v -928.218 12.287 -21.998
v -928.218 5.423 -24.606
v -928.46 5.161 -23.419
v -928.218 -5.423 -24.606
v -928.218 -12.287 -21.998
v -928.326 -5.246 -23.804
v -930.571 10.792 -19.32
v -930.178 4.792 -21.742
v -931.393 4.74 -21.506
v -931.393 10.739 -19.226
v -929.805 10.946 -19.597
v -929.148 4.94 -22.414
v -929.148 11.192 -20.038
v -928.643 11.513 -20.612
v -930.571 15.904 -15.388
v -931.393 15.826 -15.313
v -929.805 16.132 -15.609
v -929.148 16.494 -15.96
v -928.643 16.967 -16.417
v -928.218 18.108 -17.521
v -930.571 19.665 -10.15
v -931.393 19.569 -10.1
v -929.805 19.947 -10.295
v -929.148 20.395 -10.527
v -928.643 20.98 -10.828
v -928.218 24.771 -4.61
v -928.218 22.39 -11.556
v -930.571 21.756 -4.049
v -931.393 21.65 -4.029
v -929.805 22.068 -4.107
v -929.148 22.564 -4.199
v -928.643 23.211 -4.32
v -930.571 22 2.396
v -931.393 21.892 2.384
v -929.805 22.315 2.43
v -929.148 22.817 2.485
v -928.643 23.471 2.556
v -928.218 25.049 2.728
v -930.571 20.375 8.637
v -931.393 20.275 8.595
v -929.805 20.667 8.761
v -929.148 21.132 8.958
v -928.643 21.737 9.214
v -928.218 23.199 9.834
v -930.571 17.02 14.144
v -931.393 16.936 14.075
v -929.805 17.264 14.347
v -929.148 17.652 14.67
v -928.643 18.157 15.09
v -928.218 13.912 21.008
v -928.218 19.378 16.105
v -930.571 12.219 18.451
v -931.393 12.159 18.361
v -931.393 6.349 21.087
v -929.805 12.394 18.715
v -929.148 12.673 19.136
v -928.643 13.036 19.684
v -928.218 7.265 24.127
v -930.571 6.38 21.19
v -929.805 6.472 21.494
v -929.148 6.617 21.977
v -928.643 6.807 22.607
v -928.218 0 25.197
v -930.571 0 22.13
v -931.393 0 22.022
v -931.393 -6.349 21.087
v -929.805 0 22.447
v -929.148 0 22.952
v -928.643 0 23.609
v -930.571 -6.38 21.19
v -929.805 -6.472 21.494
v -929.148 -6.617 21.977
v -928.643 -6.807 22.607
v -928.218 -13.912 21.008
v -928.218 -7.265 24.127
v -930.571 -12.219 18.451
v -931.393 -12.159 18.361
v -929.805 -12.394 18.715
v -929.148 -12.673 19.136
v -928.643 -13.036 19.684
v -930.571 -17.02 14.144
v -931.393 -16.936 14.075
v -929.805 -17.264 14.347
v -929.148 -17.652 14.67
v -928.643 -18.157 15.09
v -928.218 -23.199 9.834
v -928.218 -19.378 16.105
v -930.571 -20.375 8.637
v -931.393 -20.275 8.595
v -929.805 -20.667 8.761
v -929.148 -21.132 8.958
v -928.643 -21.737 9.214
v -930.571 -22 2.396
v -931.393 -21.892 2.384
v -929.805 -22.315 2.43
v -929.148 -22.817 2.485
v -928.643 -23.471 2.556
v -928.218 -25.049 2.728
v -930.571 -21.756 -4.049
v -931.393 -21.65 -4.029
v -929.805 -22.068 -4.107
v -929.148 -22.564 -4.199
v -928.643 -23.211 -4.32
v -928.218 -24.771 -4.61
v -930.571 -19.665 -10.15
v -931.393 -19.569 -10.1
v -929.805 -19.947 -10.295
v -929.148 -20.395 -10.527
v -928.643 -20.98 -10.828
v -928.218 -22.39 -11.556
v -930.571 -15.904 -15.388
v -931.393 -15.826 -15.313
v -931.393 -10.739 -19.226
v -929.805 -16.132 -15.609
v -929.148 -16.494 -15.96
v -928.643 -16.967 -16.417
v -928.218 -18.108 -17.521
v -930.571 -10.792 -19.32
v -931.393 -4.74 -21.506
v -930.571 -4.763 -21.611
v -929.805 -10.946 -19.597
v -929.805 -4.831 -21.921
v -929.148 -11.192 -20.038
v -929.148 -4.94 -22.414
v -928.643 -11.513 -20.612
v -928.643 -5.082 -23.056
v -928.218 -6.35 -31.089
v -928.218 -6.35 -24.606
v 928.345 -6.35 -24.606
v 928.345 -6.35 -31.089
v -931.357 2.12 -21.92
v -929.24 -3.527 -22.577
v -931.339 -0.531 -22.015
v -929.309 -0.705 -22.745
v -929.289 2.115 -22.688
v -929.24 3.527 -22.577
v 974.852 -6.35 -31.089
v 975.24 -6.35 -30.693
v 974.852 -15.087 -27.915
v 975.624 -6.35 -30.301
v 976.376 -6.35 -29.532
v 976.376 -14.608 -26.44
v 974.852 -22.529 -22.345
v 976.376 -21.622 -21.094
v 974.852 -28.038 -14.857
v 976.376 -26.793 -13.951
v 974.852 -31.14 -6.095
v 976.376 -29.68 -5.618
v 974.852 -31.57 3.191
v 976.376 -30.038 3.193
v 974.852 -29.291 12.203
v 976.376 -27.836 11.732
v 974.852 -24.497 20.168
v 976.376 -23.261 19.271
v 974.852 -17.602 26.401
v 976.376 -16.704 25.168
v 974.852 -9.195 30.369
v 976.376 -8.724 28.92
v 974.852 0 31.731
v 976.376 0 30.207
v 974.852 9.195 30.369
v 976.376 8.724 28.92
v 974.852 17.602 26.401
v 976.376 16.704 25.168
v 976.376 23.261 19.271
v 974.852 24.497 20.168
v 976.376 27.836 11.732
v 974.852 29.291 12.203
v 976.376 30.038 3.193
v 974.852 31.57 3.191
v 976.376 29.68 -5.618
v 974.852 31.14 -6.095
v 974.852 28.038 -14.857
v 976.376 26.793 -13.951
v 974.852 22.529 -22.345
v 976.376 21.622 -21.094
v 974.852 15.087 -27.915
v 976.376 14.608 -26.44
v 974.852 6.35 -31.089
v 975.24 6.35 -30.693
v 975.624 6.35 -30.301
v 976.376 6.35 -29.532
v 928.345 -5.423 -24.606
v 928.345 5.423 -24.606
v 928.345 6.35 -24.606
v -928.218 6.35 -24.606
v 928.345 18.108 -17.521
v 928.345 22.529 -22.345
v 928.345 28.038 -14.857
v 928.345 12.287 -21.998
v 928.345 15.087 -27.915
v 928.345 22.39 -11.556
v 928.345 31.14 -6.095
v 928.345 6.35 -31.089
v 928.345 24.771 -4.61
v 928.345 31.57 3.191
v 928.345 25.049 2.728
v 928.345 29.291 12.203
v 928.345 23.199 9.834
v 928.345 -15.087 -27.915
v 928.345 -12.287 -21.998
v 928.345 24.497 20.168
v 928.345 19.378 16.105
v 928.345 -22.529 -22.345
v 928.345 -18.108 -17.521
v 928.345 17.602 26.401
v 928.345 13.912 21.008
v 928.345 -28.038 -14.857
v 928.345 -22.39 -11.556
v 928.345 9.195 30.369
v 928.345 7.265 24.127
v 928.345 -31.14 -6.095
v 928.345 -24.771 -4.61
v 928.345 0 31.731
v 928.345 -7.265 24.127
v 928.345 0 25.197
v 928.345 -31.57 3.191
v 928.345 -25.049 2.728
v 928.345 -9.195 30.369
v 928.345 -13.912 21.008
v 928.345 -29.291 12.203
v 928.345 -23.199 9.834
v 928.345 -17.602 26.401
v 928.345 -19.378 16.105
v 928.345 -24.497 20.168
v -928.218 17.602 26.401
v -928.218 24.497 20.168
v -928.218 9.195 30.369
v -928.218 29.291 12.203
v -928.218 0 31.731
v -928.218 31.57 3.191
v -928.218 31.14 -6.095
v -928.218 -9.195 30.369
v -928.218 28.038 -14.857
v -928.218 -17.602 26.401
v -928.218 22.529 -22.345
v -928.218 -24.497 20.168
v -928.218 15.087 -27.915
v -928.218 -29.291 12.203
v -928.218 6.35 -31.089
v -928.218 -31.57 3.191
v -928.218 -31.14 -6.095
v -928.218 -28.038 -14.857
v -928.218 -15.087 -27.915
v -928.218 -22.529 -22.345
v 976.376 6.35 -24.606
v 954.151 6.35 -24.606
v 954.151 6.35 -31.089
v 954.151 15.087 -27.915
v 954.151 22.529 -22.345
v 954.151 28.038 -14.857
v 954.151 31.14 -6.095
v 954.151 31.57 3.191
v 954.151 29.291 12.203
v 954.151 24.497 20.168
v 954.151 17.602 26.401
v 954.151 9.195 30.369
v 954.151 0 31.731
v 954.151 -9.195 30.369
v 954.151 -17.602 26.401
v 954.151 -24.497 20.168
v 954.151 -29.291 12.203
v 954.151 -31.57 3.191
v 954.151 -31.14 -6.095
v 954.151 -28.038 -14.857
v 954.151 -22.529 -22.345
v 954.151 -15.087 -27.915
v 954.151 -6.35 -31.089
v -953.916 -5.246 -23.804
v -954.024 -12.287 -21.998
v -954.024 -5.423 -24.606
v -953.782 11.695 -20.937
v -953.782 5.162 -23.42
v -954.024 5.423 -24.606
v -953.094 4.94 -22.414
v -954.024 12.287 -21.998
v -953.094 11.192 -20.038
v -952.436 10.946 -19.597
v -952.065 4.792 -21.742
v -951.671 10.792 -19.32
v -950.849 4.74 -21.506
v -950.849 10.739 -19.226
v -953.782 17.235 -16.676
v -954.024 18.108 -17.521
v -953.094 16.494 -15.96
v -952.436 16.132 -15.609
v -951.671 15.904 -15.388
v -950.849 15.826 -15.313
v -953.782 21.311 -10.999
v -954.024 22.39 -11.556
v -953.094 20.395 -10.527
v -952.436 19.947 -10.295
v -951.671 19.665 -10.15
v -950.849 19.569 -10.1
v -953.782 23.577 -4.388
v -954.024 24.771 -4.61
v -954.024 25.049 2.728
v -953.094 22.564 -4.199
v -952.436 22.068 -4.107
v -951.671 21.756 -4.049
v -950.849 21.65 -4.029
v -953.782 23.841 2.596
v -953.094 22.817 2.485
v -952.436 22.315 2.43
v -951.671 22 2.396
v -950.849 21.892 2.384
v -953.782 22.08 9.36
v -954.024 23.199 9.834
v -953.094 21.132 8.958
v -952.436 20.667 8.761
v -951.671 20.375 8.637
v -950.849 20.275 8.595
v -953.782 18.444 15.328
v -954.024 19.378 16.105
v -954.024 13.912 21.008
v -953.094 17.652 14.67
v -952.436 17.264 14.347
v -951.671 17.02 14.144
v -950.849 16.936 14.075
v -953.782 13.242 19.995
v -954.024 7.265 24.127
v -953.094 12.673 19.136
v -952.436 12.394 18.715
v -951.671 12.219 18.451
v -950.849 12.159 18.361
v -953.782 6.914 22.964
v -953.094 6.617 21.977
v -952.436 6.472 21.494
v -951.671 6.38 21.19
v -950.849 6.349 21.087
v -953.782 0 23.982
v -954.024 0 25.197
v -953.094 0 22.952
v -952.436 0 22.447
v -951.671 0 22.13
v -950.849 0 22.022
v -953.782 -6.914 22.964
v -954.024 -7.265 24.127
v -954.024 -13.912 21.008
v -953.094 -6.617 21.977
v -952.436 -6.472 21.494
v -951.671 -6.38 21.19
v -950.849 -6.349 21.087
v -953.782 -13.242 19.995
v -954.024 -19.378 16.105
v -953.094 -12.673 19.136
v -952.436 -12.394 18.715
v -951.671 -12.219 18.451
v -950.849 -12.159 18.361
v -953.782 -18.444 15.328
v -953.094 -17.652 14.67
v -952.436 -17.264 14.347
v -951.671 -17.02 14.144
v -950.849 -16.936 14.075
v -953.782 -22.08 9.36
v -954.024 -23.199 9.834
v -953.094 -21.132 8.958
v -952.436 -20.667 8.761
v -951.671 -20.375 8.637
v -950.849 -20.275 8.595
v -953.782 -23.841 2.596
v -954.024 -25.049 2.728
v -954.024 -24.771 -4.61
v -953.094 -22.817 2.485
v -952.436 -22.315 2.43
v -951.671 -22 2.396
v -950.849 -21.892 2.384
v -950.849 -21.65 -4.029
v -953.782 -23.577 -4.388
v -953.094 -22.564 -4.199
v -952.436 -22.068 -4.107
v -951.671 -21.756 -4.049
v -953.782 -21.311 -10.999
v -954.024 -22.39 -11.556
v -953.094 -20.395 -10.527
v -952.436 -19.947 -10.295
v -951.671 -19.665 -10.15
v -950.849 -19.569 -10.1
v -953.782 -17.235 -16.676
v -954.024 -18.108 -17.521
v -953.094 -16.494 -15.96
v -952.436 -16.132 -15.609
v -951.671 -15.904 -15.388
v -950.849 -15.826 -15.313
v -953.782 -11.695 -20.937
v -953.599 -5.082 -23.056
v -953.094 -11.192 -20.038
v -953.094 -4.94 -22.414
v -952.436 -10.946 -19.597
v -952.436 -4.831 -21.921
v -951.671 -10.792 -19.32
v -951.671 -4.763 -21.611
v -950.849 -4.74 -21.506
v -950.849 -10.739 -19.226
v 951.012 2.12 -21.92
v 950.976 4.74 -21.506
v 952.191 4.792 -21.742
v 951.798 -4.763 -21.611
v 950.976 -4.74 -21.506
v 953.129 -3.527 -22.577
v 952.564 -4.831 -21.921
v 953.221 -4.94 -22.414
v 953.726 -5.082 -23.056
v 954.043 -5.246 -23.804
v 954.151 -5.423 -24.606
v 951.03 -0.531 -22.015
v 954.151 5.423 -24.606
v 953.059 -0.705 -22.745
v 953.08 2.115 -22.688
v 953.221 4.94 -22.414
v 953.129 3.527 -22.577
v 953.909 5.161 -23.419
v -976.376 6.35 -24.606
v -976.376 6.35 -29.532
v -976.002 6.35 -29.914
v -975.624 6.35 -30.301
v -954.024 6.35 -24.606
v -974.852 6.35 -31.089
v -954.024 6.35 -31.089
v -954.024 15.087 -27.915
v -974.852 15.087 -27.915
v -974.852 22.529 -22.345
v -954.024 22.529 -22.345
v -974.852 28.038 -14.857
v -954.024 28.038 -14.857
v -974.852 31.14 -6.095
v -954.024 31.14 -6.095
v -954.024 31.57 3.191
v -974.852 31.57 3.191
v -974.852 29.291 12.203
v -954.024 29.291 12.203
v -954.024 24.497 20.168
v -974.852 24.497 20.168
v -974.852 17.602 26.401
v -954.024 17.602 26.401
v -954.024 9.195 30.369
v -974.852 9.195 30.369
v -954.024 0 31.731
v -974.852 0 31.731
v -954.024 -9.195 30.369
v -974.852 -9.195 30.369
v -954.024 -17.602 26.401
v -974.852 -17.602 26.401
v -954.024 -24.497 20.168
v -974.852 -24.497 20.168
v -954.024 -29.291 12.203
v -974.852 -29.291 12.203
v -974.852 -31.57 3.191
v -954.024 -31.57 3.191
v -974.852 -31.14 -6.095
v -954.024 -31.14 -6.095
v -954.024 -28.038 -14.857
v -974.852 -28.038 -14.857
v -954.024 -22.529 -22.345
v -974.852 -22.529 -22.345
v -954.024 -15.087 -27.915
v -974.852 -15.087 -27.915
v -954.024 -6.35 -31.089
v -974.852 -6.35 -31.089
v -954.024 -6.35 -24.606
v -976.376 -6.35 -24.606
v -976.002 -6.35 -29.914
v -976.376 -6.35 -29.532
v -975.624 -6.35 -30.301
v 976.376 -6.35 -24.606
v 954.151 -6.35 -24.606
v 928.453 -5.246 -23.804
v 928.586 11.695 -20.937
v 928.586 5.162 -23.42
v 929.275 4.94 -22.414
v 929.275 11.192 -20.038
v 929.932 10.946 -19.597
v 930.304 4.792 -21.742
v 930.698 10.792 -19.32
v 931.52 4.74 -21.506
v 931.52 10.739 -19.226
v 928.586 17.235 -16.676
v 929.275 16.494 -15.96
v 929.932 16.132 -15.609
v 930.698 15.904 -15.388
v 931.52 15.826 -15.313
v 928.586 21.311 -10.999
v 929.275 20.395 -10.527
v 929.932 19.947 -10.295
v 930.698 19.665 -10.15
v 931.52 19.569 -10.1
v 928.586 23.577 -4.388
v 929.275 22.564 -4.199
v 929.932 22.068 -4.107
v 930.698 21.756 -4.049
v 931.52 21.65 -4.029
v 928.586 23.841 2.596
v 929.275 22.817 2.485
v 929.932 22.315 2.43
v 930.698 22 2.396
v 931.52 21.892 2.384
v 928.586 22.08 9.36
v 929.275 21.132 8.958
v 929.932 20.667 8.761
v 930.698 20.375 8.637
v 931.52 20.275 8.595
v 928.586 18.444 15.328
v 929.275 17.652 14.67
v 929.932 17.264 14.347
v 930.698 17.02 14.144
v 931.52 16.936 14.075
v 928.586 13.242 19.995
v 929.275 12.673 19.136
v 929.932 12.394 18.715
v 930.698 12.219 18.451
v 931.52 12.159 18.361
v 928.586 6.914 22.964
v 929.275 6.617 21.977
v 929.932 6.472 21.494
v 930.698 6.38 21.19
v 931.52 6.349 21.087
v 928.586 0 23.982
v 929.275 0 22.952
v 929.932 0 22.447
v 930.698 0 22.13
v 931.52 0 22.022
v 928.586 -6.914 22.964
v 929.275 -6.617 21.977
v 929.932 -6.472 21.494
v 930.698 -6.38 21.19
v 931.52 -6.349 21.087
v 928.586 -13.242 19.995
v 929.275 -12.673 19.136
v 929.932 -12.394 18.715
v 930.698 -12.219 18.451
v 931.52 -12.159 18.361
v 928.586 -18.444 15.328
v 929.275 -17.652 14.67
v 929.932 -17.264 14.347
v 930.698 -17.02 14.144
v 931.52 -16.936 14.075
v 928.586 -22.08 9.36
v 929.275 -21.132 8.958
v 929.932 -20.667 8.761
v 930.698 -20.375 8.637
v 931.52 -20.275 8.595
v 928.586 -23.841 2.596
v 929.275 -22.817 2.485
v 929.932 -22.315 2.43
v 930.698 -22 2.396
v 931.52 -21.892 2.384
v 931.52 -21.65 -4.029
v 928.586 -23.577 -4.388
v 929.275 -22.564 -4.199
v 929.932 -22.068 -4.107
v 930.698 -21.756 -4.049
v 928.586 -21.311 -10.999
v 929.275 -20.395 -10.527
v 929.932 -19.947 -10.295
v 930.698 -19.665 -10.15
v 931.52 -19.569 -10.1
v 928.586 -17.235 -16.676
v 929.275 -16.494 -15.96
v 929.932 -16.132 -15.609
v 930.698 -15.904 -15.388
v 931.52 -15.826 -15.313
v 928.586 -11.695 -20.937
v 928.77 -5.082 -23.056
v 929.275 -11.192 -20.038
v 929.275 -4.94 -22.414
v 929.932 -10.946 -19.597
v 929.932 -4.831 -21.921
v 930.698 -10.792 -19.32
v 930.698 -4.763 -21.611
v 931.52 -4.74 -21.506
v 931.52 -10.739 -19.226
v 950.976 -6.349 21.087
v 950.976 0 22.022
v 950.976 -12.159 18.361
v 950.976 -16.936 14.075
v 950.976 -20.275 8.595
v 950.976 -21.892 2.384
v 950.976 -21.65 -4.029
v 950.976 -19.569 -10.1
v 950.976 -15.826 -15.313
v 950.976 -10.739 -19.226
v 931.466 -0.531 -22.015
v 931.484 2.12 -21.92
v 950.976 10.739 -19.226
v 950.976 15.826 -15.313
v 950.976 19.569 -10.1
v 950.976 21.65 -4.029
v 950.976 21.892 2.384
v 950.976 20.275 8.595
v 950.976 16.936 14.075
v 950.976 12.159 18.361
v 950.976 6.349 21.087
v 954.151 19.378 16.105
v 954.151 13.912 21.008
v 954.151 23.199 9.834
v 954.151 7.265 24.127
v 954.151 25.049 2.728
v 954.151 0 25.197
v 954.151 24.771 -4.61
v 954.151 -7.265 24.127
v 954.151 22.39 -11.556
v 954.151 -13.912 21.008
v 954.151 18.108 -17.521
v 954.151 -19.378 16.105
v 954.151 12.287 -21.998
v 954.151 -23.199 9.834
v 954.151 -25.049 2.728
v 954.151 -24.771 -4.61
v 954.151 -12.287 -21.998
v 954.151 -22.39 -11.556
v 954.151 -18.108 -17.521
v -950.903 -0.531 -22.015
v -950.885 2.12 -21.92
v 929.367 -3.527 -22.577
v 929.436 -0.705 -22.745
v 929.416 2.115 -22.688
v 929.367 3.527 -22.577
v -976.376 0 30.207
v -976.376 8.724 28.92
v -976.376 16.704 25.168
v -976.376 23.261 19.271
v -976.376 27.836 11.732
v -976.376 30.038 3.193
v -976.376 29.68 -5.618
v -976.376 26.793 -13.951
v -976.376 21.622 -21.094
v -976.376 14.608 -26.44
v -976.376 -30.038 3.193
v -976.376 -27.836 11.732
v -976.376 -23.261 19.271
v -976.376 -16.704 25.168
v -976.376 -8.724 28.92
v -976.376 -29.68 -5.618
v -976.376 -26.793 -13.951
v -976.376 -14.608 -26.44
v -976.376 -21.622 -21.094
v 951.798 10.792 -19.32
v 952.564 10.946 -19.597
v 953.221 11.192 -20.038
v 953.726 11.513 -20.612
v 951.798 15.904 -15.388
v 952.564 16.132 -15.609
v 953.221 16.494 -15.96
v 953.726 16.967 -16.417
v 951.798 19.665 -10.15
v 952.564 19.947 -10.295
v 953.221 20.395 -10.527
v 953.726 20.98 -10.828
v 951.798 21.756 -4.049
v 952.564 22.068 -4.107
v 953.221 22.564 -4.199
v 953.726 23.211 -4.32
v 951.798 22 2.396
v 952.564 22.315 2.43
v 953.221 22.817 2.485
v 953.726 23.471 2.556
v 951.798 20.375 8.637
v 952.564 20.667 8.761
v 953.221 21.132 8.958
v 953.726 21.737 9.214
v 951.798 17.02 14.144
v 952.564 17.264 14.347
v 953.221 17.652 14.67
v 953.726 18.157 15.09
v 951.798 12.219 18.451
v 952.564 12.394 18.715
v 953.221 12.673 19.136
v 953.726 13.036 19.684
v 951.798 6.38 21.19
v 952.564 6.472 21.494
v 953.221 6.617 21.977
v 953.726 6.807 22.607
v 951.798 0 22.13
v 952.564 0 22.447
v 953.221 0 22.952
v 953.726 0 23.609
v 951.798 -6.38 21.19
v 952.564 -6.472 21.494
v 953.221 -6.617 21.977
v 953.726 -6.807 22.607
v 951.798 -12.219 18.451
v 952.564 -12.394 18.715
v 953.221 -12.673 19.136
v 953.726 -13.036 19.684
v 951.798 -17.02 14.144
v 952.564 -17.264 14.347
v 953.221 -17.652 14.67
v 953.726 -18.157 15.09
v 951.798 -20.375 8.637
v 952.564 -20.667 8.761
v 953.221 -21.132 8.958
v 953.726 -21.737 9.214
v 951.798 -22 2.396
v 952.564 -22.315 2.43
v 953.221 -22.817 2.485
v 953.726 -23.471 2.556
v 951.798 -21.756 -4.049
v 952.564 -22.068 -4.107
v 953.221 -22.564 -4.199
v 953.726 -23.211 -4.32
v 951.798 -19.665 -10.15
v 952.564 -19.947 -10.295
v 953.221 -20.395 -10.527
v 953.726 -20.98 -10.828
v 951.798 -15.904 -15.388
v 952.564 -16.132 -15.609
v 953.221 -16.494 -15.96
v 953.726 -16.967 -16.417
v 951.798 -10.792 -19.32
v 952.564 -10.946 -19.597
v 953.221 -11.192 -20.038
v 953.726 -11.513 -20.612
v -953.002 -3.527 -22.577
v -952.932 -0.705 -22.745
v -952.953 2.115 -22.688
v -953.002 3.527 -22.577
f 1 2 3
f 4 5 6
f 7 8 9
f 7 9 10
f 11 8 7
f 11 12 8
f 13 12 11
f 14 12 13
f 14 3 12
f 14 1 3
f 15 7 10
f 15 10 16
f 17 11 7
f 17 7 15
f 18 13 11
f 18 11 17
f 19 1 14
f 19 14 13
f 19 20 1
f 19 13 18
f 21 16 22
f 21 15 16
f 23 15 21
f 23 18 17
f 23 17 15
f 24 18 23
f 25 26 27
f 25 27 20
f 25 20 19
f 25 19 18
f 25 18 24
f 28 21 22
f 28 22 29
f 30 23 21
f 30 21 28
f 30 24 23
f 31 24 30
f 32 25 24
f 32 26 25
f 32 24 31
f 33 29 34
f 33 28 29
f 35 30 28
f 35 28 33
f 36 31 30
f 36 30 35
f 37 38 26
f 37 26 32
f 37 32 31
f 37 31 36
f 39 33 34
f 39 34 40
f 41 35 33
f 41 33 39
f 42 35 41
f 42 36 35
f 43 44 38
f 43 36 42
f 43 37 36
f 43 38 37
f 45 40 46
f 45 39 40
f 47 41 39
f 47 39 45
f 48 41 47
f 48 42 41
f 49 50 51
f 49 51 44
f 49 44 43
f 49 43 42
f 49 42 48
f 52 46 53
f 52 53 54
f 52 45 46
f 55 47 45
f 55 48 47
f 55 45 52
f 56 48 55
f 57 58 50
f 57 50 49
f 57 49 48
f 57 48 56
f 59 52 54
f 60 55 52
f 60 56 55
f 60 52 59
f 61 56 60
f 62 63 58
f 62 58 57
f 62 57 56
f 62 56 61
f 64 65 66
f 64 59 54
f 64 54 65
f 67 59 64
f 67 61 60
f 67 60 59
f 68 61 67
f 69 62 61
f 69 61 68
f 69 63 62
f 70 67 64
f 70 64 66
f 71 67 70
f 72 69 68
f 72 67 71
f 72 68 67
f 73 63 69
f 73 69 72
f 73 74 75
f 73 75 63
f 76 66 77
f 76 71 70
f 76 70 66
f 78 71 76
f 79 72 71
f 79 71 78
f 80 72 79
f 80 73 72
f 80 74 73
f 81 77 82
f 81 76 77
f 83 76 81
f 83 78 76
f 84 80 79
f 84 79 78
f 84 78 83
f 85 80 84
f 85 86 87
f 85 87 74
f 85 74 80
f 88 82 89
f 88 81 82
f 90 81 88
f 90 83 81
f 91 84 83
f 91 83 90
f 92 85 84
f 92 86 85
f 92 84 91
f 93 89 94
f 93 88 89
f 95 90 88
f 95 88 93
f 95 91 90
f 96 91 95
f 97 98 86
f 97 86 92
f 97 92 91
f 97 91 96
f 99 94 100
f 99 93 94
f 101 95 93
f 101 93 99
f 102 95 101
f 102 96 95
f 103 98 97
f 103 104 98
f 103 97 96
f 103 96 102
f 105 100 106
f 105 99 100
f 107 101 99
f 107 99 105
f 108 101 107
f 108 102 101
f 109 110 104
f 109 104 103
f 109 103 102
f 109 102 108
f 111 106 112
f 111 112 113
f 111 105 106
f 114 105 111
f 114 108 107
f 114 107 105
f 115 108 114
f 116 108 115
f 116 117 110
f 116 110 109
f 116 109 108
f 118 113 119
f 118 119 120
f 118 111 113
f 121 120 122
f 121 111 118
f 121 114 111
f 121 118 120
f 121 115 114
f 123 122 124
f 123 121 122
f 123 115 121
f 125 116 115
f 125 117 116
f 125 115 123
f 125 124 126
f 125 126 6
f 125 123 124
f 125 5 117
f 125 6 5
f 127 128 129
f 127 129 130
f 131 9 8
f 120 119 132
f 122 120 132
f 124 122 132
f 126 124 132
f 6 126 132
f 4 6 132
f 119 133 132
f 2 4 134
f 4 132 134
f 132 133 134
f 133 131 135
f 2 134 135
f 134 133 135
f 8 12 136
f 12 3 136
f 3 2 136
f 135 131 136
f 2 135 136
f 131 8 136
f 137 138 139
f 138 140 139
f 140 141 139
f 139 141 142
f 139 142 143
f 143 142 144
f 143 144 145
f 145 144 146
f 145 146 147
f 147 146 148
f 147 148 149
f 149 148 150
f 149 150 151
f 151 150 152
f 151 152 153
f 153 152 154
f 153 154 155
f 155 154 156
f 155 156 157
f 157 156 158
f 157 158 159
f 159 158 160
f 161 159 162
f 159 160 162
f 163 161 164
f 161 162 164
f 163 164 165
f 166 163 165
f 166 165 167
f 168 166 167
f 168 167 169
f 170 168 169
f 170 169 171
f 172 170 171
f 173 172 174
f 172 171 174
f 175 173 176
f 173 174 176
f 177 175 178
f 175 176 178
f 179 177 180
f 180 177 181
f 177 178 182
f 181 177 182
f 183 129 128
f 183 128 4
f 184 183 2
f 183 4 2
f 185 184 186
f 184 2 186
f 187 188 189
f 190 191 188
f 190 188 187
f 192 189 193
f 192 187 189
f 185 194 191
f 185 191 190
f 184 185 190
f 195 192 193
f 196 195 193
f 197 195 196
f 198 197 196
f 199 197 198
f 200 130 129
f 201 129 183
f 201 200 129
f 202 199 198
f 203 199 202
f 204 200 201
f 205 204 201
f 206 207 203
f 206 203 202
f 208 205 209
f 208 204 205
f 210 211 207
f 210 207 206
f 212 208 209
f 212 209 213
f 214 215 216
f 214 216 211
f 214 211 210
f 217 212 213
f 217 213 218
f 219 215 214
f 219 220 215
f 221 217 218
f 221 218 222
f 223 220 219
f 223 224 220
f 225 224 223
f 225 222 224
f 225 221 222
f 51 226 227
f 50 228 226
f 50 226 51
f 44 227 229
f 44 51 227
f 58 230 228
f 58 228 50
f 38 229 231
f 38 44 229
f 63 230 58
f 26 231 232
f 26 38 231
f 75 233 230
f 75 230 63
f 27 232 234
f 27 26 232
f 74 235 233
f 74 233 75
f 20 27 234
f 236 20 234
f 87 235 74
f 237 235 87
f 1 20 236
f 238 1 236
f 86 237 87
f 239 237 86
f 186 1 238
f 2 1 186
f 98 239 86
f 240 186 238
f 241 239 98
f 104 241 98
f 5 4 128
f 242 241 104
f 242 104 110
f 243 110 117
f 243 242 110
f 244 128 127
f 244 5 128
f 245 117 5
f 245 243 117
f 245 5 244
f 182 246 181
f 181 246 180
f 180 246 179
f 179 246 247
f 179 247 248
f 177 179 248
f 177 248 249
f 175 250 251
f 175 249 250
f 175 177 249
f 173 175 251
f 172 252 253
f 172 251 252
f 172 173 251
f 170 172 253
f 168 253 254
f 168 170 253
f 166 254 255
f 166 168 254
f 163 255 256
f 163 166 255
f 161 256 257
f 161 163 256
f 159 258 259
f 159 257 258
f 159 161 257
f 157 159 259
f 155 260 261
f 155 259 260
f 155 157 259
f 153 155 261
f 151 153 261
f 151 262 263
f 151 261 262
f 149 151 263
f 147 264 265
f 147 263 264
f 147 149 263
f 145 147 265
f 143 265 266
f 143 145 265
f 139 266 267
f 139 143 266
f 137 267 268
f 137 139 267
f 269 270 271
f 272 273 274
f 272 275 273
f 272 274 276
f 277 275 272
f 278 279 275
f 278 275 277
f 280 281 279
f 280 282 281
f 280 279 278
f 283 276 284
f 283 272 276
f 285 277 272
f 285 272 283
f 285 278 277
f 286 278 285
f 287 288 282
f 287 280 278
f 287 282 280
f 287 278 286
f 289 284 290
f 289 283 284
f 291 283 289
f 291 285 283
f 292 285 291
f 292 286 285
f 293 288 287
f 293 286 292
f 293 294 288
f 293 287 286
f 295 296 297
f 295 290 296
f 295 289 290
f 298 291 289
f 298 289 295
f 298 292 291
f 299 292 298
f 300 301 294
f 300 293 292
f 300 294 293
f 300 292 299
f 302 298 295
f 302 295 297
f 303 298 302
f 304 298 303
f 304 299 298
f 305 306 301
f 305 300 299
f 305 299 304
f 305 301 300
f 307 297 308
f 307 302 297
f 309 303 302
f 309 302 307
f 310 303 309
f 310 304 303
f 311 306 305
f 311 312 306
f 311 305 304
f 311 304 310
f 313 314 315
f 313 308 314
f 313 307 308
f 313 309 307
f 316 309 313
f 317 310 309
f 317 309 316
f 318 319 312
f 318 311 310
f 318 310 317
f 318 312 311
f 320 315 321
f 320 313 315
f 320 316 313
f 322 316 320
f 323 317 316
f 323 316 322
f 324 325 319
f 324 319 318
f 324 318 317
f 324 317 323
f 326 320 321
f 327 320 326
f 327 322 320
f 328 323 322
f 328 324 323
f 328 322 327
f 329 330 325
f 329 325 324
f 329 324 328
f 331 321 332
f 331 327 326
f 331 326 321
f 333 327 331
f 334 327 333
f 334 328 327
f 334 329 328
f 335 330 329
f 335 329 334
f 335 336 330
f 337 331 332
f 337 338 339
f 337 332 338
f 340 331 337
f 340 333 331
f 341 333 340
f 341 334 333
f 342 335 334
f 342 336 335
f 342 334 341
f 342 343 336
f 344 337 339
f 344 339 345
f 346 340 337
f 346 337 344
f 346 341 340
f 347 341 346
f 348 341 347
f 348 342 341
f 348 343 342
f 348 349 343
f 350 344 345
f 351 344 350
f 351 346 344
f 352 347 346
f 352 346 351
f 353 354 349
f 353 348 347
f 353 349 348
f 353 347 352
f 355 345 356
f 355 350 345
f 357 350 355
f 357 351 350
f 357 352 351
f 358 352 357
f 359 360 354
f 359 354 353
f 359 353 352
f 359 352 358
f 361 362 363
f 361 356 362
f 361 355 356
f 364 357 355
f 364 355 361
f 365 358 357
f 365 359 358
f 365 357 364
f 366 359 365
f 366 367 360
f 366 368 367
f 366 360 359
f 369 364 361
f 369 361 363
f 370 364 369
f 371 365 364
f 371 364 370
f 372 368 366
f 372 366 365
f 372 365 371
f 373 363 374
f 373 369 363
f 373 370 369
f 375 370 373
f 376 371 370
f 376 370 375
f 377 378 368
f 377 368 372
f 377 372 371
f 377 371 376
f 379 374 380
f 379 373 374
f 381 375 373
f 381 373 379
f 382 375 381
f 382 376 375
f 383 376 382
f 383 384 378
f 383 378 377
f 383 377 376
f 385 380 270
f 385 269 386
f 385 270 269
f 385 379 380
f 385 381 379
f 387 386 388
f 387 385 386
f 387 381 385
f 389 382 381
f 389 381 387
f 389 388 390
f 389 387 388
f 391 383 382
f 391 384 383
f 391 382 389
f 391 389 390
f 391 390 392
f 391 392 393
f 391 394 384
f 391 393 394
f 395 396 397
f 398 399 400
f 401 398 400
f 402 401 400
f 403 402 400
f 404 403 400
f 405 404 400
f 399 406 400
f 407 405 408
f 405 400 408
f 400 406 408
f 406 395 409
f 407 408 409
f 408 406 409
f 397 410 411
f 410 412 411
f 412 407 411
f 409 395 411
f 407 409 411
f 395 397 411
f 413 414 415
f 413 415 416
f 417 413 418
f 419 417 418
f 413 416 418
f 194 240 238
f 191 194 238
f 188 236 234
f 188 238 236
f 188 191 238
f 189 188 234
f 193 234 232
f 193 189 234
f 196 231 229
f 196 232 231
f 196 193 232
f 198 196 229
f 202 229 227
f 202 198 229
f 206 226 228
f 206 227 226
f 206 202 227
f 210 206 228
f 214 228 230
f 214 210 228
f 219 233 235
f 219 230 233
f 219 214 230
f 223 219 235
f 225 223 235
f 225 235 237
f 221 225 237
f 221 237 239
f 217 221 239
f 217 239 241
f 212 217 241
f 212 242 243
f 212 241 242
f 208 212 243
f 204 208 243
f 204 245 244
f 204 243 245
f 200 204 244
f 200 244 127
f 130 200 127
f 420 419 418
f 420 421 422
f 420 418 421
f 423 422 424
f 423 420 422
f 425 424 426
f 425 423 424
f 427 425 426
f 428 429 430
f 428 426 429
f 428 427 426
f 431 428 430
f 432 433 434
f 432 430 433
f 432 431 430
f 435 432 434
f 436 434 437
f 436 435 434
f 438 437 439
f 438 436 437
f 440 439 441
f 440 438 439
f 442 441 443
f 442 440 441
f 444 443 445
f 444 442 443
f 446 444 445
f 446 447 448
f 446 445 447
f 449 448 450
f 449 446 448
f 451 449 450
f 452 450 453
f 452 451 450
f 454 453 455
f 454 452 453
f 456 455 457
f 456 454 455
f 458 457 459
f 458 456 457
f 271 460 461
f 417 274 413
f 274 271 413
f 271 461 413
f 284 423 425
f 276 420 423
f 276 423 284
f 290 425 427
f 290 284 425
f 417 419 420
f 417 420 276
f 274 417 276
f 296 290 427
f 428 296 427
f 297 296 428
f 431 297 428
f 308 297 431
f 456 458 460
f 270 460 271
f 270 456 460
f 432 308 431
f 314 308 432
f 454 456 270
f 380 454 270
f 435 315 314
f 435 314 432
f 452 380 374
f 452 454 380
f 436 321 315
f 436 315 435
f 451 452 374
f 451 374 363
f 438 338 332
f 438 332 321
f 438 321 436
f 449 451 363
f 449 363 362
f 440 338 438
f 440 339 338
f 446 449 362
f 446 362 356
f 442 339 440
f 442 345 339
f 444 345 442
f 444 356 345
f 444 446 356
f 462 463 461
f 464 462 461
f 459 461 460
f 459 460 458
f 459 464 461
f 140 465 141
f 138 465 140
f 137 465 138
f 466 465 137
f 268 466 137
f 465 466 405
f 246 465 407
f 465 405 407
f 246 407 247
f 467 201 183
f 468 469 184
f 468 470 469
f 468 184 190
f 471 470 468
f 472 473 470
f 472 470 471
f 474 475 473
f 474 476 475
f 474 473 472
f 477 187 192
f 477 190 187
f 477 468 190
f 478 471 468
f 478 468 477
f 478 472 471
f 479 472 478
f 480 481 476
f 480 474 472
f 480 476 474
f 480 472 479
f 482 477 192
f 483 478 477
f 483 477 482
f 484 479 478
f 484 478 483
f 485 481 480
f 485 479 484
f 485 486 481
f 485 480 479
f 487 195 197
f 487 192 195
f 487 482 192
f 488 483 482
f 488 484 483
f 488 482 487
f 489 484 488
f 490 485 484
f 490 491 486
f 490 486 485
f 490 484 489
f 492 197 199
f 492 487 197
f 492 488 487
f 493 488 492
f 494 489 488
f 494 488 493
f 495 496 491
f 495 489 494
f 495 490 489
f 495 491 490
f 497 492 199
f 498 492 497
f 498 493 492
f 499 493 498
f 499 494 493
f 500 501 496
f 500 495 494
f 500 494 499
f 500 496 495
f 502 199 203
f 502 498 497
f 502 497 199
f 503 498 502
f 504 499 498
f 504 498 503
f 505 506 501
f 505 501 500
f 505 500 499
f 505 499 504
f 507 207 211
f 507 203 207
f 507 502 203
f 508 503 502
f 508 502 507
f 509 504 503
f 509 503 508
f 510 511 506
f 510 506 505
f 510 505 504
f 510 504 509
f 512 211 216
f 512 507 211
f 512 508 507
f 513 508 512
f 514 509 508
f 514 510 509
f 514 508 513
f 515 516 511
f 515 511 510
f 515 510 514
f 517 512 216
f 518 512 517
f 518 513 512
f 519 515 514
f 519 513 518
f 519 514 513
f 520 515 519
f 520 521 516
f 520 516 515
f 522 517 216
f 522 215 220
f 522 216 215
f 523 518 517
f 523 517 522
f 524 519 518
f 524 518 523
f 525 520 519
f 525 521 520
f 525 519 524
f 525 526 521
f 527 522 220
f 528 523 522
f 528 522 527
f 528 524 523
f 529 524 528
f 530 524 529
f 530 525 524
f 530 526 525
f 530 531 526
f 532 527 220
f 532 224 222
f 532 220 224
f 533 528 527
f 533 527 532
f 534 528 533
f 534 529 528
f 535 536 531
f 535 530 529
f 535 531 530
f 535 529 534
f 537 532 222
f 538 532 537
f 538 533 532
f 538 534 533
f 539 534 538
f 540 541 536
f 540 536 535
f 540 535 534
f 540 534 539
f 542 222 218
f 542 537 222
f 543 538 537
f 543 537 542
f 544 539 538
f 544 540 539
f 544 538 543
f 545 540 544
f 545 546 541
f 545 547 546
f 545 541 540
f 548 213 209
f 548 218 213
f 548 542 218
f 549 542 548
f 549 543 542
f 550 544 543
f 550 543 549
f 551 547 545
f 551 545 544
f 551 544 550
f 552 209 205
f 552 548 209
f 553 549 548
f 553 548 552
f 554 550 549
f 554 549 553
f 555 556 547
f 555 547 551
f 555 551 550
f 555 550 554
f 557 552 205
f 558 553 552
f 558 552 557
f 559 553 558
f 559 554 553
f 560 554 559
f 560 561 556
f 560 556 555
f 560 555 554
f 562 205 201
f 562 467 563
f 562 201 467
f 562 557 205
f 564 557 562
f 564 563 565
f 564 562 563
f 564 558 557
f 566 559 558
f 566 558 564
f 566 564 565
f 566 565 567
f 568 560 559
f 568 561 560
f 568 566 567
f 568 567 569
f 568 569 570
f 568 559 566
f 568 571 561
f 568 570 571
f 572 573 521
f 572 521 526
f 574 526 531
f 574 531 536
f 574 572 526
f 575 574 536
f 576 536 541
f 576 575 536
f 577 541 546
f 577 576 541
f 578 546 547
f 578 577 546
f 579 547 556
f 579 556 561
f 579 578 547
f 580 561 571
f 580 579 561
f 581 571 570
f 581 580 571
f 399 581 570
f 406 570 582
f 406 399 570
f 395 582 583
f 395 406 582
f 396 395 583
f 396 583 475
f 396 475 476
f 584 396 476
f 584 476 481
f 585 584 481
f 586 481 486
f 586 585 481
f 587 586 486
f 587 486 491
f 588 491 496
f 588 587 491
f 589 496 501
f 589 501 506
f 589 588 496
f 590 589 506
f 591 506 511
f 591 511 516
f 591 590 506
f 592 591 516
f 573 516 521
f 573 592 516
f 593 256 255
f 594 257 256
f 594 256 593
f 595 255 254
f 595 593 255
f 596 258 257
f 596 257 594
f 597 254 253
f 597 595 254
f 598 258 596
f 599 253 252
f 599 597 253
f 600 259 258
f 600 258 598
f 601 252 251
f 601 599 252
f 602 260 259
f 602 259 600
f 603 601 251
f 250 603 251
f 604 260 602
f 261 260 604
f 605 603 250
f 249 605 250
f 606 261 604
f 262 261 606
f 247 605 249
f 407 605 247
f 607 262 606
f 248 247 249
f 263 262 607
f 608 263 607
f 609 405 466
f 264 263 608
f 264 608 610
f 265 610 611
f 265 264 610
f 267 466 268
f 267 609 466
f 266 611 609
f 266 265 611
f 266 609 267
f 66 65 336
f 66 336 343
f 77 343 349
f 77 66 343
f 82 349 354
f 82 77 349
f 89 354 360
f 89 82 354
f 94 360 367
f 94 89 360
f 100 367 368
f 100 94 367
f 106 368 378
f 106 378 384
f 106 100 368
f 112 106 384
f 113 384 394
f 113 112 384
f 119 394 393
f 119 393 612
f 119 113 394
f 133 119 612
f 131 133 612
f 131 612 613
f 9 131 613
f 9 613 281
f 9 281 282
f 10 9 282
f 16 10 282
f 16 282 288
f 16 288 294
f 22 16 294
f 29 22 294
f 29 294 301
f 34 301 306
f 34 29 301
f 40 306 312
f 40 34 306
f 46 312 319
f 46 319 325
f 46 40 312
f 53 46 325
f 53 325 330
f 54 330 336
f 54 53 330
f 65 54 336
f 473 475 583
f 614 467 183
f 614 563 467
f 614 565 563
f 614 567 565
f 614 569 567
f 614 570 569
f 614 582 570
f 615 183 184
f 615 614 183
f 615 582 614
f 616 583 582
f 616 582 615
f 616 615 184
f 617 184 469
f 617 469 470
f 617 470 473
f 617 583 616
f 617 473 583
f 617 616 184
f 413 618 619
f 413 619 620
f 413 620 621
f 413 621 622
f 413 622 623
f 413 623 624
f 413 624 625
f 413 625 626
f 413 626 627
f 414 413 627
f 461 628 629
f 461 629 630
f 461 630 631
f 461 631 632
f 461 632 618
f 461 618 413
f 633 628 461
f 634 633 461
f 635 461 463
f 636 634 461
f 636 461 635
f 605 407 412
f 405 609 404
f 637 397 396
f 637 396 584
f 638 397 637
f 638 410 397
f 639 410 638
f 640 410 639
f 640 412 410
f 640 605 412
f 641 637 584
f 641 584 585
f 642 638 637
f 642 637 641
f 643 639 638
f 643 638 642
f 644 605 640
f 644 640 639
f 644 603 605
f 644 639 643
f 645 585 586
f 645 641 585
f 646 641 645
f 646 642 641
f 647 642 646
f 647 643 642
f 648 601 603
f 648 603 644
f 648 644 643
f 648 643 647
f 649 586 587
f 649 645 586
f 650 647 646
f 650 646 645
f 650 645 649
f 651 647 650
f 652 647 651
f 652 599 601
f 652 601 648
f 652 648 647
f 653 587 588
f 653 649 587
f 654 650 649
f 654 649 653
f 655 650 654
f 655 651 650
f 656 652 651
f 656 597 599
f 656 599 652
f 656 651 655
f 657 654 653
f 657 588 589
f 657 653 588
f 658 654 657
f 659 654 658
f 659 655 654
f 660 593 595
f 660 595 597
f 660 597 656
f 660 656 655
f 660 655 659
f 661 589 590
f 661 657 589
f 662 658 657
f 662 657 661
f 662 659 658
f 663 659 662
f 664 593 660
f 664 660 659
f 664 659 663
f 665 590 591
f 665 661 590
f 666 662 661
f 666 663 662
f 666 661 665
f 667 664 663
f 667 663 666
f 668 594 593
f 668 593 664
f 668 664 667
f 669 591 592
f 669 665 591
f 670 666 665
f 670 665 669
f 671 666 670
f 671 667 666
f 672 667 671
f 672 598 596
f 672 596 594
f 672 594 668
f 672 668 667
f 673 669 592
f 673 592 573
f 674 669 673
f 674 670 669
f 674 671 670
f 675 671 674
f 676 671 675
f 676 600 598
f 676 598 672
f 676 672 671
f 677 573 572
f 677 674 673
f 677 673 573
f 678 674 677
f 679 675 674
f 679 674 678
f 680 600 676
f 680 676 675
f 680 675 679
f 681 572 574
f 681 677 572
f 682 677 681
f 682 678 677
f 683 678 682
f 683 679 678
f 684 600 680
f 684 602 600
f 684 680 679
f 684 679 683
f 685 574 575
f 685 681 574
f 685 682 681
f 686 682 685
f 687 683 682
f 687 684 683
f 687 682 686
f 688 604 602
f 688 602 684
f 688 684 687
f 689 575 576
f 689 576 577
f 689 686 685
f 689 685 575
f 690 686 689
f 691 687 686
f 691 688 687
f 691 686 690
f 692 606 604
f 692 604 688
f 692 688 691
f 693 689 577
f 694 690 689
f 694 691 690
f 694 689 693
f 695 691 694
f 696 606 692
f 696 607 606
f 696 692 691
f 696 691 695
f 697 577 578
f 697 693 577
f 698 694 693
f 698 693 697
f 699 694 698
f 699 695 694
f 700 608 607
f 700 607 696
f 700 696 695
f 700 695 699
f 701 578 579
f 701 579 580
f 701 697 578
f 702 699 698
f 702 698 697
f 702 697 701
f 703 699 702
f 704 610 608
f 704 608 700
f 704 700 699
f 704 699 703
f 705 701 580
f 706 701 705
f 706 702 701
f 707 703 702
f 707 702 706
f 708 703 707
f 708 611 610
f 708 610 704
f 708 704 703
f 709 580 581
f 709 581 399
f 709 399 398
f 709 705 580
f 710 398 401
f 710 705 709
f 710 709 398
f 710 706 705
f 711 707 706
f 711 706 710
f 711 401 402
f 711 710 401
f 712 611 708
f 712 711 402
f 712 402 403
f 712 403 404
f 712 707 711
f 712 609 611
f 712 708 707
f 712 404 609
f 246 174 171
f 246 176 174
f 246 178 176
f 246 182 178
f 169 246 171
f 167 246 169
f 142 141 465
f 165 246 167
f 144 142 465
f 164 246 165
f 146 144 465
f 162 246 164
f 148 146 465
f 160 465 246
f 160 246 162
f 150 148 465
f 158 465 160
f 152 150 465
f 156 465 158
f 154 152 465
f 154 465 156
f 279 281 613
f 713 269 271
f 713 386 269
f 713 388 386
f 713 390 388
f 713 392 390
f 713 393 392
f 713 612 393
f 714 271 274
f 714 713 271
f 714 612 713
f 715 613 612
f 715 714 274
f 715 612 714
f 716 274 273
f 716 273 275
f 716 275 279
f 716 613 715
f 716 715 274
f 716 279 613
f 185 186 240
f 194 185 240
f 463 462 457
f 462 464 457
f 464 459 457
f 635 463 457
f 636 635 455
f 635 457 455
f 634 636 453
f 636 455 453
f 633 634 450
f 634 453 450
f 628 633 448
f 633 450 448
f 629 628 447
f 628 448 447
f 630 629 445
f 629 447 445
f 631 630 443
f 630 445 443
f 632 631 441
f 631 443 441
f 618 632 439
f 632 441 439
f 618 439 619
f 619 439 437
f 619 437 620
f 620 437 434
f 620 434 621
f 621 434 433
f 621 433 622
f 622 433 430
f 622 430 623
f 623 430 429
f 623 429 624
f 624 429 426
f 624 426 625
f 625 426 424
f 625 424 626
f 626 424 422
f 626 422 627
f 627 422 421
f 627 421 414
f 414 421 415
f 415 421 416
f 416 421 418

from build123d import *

# Parameters (mm, degrees)
CUT_EXTRUDE2_START = -998.728
SKETCH2_W          = 63.4619
SKETCH2_H          = 12.7
CUT_EXTRUDE2_DEPTH = 1997.456
FILLET1_R          = 3.175
CHAMFER1_SIZE      = 1.524


with BuildPart() as part:
    # Sketch1 → Revolve1 (revolve)
    with BuildSketch(Plane(origin=(0, 0, 0), x_dir=(1, 0, 0), z_dir=(0, 1, 0)), mode=Mode.PRIVATE) as revolve1_sk:
        Polygon((-976.376, 0), (-976.376, 31.73095), (-954.024, 31.73095), (-954.024, 22.0218), (-928.2176, 22.0218), (-928.2176, 31.73095), (928.3446, 31.73095), (928.3446, 22.0218), (954.151, 22.0218), (954.151, 31.73095), (976.376, 31.73095), (976.376, 0), align=None)
    revolve(revolve1_sk.sketch.rotate(Axis((-1001.776, 0, 0), (1, 0, 0)), 180), axis=Axis((-1001.776, 0, 0), (1, 0, 0)))

    # Sketch2 → Cut-Extrude2 (cut)
    with BuildSketch(Plane(origin=(0, 0, 0), x_dir=(0, 0, -1), z_dir=(1, 0, 0)).offset(CUT_EXTRUDE2_START)):
        with Locations((56.3372, 0)):
            Rectangle(SKETCH2_W, SKETCH2_H)
    extrude(amount=CUT_EXTRUDE2_DEPTH, mode=Mode.SUBTRACT)

    # Fillet1
    fillet1_edges = [part.edges().sort_by_distance(p)[0] for p in [
        (954.151, 0, -22.0218),
        (928.3446, 0, -22.0218),
        (-928.2176, 0, -22.0218),
        (-954.024, 0, -22.0218),
    ]]
    fillet(fillet1_edges, radius=FILLET1_R)

    # Chamfer1
    chamfer1_edges = [part.edges().sort_by_distance(p)[0] for p in [
        (976.376, 0, 31.73095),
        (-976.376, 0, 31.73095),
    ]]
    chamfer(chamfer1_edges, length=CHAMFER1_SIZE)


solid = part.part
